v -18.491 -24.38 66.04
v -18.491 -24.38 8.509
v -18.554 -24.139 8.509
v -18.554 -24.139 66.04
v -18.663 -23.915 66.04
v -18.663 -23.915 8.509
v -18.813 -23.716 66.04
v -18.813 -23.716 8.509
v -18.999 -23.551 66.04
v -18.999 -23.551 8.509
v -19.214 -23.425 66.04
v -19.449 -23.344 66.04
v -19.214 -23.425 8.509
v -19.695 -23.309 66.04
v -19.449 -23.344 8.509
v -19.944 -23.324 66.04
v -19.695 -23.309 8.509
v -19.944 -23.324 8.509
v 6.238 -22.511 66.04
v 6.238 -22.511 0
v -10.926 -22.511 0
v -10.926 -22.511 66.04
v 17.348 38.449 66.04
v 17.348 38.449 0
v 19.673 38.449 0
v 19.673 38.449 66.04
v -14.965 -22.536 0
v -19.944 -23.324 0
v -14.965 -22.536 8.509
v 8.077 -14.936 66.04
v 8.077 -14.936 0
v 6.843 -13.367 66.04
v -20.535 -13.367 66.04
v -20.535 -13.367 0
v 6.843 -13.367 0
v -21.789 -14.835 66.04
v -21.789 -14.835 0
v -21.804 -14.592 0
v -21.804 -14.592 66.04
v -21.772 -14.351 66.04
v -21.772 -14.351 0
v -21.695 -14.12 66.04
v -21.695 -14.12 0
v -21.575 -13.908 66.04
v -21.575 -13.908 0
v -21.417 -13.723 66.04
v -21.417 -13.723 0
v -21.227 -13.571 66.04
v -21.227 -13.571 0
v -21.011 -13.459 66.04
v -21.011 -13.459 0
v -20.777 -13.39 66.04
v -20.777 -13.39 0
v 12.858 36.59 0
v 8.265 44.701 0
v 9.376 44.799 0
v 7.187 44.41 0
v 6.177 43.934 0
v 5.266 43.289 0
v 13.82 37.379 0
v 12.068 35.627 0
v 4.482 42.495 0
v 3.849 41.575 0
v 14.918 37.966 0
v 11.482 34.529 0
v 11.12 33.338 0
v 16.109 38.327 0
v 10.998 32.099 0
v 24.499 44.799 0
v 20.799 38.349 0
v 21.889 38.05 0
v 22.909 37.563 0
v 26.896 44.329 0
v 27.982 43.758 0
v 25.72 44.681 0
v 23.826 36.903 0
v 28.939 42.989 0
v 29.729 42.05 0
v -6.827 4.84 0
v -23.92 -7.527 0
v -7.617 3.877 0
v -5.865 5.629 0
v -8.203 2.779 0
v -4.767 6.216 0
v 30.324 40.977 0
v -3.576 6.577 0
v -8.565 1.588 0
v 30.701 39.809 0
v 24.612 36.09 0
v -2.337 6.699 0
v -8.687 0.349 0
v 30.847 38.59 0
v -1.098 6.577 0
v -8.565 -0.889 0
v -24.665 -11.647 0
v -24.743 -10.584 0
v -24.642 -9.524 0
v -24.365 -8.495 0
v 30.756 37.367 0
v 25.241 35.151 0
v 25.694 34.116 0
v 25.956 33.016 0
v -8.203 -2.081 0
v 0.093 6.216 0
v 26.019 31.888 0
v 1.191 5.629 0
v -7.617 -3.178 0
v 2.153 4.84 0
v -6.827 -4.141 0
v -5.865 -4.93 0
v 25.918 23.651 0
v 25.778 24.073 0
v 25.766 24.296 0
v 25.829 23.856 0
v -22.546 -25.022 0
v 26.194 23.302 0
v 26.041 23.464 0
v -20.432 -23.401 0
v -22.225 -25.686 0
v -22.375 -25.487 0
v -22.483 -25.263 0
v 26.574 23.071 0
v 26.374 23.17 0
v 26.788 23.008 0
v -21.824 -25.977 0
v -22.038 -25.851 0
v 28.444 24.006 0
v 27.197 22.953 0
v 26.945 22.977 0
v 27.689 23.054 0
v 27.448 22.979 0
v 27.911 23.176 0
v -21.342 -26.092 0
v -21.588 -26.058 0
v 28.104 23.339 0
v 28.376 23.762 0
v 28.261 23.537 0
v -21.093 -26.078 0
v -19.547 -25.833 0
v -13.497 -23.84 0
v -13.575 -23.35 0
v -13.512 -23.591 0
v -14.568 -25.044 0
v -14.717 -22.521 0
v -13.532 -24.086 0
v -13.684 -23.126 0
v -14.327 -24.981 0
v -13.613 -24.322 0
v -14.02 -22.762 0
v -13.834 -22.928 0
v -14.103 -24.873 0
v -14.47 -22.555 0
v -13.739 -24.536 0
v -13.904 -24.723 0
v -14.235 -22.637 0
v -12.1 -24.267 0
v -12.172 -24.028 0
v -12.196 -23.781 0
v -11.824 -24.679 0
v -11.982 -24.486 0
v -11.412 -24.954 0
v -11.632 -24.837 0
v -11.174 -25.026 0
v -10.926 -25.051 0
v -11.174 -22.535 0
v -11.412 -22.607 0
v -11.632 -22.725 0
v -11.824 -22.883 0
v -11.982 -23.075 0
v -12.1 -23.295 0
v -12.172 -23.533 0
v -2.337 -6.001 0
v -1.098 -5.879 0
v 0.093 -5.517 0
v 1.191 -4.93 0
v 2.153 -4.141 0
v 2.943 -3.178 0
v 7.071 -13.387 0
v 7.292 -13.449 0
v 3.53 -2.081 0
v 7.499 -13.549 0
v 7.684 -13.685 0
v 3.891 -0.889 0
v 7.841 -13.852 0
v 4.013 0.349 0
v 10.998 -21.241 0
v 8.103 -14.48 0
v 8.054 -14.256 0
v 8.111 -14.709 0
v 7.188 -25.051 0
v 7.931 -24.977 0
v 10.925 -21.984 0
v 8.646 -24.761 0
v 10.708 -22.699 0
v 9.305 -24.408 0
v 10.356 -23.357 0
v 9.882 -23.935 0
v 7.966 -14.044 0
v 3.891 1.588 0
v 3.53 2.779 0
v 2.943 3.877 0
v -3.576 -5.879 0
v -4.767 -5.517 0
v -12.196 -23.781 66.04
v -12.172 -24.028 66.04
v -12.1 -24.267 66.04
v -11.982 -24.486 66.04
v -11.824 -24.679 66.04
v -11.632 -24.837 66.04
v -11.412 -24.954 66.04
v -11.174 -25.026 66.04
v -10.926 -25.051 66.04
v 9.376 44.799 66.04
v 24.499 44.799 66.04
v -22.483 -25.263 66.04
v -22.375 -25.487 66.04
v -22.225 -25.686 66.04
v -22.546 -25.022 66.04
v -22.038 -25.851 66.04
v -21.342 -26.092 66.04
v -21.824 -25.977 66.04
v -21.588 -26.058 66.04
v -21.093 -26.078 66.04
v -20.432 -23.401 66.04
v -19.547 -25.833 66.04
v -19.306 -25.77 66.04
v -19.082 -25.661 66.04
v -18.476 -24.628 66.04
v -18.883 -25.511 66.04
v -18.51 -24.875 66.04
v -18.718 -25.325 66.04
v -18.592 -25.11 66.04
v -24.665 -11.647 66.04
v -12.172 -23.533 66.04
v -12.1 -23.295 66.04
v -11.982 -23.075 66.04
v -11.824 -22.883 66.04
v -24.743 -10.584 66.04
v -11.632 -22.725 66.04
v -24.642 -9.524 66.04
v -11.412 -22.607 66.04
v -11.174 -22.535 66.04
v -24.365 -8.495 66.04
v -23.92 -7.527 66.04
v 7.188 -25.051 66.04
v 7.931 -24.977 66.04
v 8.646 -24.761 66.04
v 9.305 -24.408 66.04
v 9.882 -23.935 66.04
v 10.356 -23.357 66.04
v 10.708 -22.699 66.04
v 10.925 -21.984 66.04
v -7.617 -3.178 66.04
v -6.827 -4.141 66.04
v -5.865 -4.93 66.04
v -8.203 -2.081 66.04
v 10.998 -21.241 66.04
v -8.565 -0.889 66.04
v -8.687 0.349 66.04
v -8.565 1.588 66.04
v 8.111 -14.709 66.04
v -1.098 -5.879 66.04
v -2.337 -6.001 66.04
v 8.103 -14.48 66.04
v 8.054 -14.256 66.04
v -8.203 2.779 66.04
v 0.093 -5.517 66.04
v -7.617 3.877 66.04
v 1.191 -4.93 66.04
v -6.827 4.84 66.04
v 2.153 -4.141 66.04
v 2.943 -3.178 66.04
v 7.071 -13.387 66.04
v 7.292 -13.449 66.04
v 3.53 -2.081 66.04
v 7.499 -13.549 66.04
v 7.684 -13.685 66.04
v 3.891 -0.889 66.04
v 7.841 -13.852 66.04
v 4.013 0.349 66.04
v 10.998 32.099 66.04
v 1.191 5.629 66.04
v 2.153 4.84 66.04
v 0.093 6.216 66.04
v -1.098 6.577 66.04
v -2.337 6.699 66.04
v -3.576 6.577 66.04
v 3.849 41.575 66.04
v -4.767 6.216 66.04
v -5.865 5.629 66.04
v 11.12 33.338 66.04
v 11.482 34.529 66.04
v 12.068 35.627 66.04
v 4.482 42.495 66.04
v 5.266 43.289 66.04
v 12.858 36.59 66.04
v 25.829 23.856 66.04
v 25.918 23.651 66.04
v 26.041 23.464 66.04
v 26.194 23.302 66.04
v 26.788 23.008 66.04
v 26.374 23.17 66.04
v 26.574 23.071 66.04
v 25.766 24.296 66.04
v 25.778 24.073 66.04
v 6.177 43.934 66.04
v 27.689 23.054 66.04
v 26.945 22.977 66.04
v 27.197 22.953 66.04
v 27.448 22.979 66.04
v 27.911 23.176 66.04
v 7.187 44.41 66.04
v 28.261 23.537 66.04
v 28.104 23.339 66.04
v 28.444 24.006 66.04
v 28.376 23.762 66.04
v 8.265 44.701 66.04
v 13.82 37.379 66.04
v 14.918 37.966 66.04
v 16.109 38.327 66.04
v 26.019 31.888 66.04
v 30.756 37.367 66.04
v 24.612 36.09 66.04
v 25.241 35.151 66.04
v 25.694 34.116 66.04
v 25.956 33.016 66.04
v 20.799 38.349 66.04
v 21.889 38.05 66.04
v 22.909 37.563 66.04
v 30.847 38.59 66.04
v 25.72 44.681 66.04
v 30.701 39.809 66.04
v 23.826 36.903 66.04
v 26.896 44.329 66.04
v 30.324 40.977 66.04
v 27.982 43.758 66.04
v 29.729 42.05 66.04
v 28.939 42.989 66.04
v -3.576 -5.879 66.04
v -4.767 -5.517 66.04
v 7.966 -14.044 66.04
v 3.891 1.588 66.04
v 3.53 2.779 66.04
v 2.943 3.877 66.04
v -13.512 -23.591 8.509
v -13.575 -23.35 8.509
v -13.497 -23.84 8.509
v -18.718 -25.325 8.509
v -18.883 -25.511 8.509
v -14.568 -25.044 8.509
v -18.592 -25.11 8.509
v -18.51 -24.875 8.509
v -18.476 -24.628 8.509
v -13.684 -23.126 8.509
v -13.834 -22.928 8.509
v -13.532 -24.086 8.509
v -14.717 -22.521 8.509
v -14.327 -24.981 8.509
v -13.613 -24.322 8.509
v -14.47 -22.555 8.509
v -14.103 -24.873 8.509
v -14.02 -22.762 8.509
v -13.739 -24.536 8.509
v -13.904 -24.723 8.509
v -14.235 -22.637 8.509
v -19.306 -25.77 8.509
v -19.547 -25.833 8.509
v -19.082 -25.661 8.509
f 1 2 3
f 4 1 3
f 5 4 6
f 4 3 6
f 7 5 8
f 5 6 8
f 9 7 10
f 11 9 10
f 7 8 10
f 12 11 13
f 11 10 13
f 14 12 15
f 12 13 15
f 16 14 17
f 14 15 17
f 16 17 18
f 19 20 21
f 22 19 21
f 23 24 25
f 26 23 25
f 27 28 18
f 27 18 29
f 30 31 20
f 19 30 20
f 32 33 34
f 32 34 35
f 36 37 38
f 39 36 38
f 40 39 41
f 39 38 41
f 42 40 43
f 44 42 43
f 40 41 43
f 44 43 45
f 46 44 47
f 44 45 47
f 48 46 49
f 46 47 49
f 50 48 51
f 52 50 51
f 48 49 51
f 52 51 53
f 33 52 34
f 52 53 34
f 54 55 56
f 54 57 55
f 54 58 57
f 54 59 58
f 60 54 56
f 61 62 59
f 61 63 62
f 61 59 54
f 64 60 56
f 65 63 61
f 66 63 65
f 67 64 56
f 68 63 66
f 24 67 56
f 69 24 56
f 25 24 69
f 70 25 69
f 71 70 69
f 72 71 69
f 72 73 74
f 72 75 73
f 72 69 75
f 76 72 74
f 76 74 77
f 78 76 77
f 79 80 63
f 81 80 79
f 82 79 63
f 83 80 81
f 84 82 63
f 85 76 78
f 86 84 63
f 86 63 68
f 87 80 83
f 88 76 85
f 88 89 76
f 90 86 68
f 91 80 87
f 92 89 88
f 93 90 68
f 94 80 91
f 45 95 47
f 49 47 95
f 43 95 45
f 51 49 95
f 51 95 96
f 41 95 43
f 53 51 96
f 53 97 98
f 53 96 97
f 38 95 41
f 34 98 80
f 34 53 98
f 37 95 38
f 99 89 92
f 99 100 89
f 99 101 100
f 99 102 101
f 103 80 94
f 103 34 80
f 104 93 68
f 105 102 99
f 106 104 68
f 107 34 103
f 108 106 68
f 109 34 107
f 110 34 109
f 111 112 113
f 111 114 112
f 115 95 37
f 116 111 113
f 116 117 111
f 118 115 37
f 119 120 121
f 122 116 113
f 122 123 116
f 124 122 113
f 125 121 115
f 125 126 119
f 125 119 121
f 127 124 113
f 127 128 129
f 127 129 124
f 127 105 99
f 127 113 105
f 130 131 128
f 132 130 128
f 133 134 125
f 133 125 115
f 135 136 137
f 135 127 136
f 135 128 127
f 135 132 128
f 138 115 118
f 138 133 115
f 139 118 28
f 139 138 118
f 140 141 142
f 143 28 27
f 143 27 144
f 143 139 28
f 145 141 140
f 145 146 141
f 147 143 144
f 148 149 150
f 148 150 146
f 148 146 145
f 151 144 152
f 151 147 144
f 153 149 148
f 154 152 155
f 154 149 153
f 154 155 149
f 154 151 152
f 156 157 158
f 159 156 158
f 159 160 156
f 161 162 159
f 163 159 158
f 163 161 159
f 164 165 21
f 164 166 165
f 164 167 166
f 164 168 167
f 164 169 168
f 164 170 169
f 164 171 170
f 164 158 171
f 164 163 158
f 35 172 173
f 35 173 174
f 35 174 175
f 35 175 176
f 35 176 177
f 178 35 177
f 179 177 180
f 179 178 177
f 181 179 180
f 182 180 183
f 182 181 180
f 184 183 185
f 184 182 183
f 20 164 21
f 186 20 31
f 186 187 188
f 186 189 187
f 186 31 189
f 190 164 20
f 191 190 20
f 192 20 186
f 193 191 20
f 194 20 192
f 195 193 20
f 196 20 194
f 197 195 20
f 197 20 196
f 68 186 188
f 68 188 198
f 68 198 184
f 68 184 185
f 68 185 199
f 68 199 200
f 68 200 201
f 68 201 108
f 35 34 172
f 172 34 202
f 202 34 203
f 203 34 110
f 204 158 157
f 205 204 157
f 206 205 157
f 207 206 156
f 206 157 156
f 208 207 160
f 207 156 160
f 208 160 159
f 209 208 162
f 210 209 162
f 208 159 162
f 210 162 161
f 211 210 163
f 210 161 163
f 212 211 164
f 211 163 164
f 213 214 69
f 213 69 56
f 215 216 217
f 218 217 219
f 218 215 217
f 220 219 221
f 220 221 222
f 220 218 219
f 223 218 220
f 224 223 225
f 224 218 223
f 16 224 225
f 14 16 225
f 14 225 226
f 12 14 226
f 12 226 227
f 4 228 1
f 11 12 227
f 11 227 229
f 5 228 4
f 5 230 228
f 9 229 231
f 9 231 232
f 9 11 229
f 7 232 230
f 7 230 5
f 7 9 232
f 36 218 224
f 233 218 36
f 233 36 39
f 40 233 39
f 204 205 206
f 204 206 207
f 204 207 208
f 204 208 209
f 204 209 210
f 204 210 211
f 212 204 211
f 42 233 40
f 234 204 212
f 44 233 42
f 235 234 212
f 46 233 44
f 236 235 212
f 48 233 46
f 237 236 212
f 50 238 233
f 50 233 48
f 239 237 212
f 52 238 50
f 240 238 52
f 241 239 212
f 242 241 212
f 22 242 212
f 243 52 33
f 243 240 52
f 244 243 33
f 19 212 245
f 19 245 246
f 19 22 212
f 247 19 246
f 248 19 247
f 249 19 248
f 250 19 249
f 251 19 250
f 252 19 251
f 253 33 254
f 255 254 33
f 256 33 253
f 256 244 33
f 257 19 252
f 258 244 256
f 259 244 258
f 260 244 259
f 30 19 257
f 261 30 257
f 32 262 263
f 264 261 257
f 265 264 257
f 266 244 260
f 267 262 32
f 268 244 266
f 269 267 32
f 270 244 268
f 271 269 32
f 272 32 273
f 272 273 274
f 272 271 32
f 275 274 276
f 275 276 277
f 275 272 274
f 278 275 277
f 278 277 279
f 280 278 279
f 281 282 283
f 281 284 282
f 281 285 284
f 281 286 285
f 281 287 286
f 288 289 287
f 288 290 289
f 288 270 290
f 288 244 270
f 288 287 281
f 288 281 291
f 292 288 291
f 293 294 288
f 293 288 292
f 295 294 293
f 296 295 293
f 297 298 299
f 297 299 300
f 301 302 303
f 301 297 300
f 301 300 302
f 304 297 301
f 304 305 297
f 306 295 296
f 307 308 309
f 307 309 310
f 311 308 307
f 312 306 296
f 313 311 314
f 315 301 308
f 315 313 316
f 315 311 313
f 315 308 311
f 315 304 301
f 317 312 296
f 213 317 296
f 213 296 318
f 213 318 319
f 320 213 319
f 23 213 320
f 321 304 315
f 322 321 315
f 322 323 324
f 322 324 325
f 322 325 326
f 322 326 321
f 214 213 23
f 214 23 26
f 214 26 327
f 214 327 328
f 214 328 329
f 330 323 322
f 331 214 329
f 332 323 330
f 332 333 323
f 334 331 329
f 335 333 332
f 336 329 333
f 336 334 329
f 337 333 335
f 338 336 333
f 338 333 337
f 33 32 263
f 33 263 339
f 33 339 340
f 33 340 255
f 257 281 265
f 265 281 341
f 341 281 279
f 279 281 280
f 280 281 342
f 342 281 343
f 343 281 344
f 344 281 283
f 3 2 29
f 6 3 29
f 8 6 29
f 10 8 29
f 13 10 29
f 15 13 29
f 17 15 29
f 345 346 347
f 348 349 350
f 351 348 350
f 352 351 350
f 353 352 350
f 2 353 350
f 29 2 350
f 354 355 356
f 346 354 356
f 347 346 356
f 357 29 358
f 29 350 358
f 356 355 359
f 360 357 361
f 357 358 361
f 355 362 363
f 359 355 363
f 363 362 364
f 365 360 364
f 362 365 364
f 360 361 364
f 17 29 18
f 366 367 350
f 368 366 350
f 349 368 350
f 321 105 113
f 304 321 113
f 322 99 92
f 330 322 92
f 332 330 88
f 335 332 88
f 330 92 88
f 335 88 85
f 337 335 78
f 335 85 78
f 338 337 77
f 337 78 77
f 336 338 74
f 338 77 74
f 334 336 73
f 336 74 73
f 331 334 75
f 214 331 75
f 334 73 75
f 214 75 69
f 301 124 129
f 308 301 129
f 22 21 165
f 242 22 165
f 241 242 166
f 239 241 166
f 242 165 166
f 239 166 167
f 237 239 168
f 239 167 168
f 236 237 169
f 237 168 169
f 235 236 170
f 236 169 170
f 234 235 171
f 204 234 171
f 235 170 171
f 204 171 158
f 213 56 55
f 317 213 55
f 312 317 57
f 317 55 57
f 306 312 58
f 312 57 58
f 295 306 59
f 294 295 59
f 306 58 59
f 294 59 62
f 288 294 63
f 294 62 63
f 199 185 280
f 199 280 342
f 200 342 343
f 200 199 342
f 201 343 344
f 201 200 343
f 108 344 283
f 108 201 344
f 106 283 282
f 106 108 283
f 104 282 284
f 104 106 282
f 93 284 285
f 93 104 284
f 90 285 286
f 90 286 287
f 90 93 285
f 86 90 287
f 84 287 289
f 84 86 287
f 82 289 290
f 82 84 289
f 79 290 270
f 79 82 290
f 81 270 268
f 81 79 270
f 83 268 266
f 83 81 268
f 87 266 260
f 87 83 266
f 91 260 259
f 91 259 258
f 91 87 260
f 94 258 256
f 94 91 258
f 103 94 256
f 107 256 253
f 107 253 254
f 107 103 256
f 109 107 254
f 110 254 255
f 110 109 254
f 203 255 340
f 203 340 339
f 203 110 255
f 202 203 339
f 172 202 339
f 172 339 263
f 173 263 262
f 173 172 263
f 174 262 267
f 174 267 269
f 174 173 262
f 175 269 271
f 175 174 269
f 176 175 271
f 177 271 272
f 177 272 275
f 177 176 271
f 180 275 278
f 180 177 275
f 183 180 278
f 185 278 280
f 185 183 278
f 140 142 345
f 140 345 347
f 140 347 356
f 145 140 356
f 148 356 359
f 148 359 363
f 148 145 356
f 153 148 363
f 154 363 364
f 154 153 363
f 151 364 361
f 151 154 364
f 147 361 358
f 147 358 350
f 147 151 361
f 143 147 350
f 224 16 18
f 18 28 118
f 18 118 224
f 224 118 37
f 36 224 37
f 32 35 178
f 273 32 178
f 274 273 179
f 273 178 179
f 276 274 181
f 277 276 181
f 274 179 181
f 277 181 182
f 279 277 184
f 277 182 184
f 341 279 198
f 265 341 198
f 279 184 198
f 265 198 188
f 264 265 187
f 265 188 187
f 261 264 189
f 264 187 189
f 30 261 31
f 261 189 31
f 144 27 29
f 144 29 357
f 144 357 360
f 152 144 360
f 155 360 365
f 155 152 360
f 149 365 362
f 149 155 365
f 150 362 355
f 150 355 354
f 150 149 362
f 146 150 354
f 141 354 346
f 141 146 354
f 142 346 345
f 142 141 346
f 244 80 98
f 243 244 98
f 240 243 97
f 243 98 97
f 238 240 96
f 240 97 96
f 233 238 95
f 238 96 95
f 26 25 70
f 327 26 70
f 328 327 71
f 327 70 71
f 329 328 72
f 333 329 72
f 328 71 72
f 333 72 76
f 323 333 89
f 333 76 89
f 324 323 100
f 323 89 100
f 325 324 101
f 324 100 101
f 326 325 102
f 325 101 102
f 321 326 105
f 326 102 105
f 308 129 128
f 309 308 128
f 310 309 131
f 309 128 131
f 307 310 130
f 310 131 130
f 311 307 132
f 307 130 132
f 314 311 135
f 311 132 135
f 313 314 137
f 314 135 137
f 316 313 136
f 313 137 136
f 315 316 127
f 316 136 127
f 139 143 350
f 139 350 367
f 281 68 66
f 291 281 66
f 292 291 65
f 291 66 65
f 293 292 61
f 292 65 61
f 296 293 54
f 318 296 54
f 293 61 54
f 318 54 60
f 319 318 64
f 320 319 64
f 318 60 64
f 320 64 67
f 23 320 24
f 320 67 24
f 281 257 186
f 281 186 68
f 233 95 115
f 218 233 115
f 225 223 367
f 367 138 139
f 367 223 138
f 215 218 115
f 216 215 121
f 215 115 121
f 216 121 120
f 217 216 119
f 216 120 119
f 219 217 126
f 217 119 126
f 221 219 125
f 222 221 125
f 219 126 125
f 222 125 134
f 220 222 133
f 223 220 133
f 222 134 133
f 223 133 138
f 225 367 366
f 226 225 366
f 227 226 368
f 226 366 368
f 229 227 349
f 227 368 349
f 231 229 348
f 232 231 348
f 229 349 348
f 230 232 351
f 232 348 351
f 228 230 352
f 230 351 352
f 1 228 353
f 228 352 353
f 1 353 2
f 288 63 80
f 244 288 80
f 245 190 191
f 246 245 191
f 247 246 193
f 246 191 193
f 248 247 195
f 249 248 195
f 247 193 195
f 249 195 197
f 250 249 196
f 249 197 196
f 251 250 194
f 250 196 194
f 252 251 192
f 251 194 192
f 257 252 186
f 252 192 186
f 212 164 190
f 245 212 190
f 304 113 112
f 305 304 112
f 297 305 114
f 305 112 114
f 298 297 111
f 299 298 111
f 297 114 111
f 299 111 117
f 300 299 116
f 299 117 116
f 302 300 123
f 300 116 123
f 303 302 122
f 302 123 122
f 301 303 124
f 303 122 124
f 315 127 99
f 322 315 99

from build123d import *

# Parameters (mm, degrees)
F0_R     = 6.35
F1_DEPTH = 66.04
F3_DEPTH = 8.509


with BuildPart() as f1:
    # F0 (on Top) → F1 (new body)
    with BuildSketch(Plane.XY):
        with BuildLine():
            ThreePointArc((-22.546312, -25.022118), (-22.038436, -25.850898), (-21.093276, -26.077811))
            Line((-21.093276, -26.077811), (-19.546685, -25.832855))
            ThreePointArc((-19.546685, -25.832855), (-18.717905, -25.324978), (-18.490992, -24.379819))
            ThreePointArc((-18.490992, -24.379819), (-18.998869, -23.551039), (-19.944028, -23.324126))
            Line((-19.944028, -23.324126), (-20.432482, -23.40149))
            Line((-20.432482, -23.40149), (-21.789241, -14.835248))
            ThreePointArc((-21.789241, -14.835248), (-21.500592, -13.811777), (-20.534877, -13.366576))
            Line((-20.534877, -13.366576), (6.84281, -13.366576))
            ThreePointArc((6.84281, -13.366576), (7.841192, -13.851634), (8.076939, -14.936285))
            Line((8.076939, -14.936285), (6.237518, -22.510576))
            Line((6.237518, -22.510576), (-10.92632, -22.510576))
            ThreePointArc((-10.92632, -22.510576), (-11.824346, -22.882551), (-12.19632, -23.780576))
            ThreePointArc((-12.19632, -23.780576), (-11.824346, -24.678602), (-10.92632, -25.050576))
            Line((-10.92632, -25.050576), (7.188144, -25.050576))
            ThreePointArc((7.188144, -25.050576), (9.882221, -23.934653), (10.998144, -21.240576))
            Line((10.998144, -21.240576), (10.998144, 32.099424))
            ThreePointArc((10.998144, 32.099424), (12.858016, 36.589552), (17.348144, 38.449424))
            Line((17.348144, 38.449424), (19.672829, 38.449424))
            ThreePointArc((19.672829, 38.449424), (24.237179, 36.514082), (26.0193, 31.887757))
            Line((26.0193, 31.887757), (25.766103, 24.296054))
            ThreePointArc((25.766103, 24.296054), (26.040588, 23.464256), (26.788287, 23.007993))
            Line((26.788287, 23.007993), (26.945018, 22.976903))
            ThreePointArc((26.945018, 22.976903), (27.911116, 23.175751), (28.443527, 24.006066))
            Line((28.443527, 24.006066), (30.755673, 37.366601))
            ThreePointArc((30.755673, 37.366601), (29.356579, 42.538836), (24.498677, 44.799424))
            Line((24.498677, 44.799424), (9.376487, 44.799424))
            ThreePointArc((9.376487, 44.799424), (6.177033, 43.934494), (3.849171, 41.575328))
            Line((3.849171, 41.575328), (-23.920269, -7.527419))
            ThreePointArc((-23.920269, -7.527419), (-24.641712, -9.523939), (-24.664773, -11.646682))
            Line((-24.664773, -11.646682), (-22.546312, -25.022118))
        make_face()
        with Locations((-2.336856, 0.349424)):
            Circle(F0_R, mode=Mode.SUBTRACT)
    extrude(amount=F1_DEPTH)

    # F2 (on face) → F3 (join)
    with BuildSketch(Plane(origin=(0, 0, 0), x_dir=(1, 0, 0), z_dir=(0, 0, -1))):
        with BuildLine():
            ThreePointArc((-19.546685, 25.832855), (-18.490992, 24.379819), (-19.944028, 23.324126))
            Line((-19.944028, 23.324126), (-14.965174, 22.535553))
            ThreePointArc((-14.965174, 22.535553), (-14.020015, 22.762466), (-13.512138, 23.591246))
            ThreePointArc((-13.512138, 23.591246), (-13.739051, 24.536405), (-14.567831, 25.044282))
            Line((-14.567831, 25.044282), (-19.546685, 25.832855))
        make_face()
    extrude(amount=-F3_DEPTH)


solid = f1.part
